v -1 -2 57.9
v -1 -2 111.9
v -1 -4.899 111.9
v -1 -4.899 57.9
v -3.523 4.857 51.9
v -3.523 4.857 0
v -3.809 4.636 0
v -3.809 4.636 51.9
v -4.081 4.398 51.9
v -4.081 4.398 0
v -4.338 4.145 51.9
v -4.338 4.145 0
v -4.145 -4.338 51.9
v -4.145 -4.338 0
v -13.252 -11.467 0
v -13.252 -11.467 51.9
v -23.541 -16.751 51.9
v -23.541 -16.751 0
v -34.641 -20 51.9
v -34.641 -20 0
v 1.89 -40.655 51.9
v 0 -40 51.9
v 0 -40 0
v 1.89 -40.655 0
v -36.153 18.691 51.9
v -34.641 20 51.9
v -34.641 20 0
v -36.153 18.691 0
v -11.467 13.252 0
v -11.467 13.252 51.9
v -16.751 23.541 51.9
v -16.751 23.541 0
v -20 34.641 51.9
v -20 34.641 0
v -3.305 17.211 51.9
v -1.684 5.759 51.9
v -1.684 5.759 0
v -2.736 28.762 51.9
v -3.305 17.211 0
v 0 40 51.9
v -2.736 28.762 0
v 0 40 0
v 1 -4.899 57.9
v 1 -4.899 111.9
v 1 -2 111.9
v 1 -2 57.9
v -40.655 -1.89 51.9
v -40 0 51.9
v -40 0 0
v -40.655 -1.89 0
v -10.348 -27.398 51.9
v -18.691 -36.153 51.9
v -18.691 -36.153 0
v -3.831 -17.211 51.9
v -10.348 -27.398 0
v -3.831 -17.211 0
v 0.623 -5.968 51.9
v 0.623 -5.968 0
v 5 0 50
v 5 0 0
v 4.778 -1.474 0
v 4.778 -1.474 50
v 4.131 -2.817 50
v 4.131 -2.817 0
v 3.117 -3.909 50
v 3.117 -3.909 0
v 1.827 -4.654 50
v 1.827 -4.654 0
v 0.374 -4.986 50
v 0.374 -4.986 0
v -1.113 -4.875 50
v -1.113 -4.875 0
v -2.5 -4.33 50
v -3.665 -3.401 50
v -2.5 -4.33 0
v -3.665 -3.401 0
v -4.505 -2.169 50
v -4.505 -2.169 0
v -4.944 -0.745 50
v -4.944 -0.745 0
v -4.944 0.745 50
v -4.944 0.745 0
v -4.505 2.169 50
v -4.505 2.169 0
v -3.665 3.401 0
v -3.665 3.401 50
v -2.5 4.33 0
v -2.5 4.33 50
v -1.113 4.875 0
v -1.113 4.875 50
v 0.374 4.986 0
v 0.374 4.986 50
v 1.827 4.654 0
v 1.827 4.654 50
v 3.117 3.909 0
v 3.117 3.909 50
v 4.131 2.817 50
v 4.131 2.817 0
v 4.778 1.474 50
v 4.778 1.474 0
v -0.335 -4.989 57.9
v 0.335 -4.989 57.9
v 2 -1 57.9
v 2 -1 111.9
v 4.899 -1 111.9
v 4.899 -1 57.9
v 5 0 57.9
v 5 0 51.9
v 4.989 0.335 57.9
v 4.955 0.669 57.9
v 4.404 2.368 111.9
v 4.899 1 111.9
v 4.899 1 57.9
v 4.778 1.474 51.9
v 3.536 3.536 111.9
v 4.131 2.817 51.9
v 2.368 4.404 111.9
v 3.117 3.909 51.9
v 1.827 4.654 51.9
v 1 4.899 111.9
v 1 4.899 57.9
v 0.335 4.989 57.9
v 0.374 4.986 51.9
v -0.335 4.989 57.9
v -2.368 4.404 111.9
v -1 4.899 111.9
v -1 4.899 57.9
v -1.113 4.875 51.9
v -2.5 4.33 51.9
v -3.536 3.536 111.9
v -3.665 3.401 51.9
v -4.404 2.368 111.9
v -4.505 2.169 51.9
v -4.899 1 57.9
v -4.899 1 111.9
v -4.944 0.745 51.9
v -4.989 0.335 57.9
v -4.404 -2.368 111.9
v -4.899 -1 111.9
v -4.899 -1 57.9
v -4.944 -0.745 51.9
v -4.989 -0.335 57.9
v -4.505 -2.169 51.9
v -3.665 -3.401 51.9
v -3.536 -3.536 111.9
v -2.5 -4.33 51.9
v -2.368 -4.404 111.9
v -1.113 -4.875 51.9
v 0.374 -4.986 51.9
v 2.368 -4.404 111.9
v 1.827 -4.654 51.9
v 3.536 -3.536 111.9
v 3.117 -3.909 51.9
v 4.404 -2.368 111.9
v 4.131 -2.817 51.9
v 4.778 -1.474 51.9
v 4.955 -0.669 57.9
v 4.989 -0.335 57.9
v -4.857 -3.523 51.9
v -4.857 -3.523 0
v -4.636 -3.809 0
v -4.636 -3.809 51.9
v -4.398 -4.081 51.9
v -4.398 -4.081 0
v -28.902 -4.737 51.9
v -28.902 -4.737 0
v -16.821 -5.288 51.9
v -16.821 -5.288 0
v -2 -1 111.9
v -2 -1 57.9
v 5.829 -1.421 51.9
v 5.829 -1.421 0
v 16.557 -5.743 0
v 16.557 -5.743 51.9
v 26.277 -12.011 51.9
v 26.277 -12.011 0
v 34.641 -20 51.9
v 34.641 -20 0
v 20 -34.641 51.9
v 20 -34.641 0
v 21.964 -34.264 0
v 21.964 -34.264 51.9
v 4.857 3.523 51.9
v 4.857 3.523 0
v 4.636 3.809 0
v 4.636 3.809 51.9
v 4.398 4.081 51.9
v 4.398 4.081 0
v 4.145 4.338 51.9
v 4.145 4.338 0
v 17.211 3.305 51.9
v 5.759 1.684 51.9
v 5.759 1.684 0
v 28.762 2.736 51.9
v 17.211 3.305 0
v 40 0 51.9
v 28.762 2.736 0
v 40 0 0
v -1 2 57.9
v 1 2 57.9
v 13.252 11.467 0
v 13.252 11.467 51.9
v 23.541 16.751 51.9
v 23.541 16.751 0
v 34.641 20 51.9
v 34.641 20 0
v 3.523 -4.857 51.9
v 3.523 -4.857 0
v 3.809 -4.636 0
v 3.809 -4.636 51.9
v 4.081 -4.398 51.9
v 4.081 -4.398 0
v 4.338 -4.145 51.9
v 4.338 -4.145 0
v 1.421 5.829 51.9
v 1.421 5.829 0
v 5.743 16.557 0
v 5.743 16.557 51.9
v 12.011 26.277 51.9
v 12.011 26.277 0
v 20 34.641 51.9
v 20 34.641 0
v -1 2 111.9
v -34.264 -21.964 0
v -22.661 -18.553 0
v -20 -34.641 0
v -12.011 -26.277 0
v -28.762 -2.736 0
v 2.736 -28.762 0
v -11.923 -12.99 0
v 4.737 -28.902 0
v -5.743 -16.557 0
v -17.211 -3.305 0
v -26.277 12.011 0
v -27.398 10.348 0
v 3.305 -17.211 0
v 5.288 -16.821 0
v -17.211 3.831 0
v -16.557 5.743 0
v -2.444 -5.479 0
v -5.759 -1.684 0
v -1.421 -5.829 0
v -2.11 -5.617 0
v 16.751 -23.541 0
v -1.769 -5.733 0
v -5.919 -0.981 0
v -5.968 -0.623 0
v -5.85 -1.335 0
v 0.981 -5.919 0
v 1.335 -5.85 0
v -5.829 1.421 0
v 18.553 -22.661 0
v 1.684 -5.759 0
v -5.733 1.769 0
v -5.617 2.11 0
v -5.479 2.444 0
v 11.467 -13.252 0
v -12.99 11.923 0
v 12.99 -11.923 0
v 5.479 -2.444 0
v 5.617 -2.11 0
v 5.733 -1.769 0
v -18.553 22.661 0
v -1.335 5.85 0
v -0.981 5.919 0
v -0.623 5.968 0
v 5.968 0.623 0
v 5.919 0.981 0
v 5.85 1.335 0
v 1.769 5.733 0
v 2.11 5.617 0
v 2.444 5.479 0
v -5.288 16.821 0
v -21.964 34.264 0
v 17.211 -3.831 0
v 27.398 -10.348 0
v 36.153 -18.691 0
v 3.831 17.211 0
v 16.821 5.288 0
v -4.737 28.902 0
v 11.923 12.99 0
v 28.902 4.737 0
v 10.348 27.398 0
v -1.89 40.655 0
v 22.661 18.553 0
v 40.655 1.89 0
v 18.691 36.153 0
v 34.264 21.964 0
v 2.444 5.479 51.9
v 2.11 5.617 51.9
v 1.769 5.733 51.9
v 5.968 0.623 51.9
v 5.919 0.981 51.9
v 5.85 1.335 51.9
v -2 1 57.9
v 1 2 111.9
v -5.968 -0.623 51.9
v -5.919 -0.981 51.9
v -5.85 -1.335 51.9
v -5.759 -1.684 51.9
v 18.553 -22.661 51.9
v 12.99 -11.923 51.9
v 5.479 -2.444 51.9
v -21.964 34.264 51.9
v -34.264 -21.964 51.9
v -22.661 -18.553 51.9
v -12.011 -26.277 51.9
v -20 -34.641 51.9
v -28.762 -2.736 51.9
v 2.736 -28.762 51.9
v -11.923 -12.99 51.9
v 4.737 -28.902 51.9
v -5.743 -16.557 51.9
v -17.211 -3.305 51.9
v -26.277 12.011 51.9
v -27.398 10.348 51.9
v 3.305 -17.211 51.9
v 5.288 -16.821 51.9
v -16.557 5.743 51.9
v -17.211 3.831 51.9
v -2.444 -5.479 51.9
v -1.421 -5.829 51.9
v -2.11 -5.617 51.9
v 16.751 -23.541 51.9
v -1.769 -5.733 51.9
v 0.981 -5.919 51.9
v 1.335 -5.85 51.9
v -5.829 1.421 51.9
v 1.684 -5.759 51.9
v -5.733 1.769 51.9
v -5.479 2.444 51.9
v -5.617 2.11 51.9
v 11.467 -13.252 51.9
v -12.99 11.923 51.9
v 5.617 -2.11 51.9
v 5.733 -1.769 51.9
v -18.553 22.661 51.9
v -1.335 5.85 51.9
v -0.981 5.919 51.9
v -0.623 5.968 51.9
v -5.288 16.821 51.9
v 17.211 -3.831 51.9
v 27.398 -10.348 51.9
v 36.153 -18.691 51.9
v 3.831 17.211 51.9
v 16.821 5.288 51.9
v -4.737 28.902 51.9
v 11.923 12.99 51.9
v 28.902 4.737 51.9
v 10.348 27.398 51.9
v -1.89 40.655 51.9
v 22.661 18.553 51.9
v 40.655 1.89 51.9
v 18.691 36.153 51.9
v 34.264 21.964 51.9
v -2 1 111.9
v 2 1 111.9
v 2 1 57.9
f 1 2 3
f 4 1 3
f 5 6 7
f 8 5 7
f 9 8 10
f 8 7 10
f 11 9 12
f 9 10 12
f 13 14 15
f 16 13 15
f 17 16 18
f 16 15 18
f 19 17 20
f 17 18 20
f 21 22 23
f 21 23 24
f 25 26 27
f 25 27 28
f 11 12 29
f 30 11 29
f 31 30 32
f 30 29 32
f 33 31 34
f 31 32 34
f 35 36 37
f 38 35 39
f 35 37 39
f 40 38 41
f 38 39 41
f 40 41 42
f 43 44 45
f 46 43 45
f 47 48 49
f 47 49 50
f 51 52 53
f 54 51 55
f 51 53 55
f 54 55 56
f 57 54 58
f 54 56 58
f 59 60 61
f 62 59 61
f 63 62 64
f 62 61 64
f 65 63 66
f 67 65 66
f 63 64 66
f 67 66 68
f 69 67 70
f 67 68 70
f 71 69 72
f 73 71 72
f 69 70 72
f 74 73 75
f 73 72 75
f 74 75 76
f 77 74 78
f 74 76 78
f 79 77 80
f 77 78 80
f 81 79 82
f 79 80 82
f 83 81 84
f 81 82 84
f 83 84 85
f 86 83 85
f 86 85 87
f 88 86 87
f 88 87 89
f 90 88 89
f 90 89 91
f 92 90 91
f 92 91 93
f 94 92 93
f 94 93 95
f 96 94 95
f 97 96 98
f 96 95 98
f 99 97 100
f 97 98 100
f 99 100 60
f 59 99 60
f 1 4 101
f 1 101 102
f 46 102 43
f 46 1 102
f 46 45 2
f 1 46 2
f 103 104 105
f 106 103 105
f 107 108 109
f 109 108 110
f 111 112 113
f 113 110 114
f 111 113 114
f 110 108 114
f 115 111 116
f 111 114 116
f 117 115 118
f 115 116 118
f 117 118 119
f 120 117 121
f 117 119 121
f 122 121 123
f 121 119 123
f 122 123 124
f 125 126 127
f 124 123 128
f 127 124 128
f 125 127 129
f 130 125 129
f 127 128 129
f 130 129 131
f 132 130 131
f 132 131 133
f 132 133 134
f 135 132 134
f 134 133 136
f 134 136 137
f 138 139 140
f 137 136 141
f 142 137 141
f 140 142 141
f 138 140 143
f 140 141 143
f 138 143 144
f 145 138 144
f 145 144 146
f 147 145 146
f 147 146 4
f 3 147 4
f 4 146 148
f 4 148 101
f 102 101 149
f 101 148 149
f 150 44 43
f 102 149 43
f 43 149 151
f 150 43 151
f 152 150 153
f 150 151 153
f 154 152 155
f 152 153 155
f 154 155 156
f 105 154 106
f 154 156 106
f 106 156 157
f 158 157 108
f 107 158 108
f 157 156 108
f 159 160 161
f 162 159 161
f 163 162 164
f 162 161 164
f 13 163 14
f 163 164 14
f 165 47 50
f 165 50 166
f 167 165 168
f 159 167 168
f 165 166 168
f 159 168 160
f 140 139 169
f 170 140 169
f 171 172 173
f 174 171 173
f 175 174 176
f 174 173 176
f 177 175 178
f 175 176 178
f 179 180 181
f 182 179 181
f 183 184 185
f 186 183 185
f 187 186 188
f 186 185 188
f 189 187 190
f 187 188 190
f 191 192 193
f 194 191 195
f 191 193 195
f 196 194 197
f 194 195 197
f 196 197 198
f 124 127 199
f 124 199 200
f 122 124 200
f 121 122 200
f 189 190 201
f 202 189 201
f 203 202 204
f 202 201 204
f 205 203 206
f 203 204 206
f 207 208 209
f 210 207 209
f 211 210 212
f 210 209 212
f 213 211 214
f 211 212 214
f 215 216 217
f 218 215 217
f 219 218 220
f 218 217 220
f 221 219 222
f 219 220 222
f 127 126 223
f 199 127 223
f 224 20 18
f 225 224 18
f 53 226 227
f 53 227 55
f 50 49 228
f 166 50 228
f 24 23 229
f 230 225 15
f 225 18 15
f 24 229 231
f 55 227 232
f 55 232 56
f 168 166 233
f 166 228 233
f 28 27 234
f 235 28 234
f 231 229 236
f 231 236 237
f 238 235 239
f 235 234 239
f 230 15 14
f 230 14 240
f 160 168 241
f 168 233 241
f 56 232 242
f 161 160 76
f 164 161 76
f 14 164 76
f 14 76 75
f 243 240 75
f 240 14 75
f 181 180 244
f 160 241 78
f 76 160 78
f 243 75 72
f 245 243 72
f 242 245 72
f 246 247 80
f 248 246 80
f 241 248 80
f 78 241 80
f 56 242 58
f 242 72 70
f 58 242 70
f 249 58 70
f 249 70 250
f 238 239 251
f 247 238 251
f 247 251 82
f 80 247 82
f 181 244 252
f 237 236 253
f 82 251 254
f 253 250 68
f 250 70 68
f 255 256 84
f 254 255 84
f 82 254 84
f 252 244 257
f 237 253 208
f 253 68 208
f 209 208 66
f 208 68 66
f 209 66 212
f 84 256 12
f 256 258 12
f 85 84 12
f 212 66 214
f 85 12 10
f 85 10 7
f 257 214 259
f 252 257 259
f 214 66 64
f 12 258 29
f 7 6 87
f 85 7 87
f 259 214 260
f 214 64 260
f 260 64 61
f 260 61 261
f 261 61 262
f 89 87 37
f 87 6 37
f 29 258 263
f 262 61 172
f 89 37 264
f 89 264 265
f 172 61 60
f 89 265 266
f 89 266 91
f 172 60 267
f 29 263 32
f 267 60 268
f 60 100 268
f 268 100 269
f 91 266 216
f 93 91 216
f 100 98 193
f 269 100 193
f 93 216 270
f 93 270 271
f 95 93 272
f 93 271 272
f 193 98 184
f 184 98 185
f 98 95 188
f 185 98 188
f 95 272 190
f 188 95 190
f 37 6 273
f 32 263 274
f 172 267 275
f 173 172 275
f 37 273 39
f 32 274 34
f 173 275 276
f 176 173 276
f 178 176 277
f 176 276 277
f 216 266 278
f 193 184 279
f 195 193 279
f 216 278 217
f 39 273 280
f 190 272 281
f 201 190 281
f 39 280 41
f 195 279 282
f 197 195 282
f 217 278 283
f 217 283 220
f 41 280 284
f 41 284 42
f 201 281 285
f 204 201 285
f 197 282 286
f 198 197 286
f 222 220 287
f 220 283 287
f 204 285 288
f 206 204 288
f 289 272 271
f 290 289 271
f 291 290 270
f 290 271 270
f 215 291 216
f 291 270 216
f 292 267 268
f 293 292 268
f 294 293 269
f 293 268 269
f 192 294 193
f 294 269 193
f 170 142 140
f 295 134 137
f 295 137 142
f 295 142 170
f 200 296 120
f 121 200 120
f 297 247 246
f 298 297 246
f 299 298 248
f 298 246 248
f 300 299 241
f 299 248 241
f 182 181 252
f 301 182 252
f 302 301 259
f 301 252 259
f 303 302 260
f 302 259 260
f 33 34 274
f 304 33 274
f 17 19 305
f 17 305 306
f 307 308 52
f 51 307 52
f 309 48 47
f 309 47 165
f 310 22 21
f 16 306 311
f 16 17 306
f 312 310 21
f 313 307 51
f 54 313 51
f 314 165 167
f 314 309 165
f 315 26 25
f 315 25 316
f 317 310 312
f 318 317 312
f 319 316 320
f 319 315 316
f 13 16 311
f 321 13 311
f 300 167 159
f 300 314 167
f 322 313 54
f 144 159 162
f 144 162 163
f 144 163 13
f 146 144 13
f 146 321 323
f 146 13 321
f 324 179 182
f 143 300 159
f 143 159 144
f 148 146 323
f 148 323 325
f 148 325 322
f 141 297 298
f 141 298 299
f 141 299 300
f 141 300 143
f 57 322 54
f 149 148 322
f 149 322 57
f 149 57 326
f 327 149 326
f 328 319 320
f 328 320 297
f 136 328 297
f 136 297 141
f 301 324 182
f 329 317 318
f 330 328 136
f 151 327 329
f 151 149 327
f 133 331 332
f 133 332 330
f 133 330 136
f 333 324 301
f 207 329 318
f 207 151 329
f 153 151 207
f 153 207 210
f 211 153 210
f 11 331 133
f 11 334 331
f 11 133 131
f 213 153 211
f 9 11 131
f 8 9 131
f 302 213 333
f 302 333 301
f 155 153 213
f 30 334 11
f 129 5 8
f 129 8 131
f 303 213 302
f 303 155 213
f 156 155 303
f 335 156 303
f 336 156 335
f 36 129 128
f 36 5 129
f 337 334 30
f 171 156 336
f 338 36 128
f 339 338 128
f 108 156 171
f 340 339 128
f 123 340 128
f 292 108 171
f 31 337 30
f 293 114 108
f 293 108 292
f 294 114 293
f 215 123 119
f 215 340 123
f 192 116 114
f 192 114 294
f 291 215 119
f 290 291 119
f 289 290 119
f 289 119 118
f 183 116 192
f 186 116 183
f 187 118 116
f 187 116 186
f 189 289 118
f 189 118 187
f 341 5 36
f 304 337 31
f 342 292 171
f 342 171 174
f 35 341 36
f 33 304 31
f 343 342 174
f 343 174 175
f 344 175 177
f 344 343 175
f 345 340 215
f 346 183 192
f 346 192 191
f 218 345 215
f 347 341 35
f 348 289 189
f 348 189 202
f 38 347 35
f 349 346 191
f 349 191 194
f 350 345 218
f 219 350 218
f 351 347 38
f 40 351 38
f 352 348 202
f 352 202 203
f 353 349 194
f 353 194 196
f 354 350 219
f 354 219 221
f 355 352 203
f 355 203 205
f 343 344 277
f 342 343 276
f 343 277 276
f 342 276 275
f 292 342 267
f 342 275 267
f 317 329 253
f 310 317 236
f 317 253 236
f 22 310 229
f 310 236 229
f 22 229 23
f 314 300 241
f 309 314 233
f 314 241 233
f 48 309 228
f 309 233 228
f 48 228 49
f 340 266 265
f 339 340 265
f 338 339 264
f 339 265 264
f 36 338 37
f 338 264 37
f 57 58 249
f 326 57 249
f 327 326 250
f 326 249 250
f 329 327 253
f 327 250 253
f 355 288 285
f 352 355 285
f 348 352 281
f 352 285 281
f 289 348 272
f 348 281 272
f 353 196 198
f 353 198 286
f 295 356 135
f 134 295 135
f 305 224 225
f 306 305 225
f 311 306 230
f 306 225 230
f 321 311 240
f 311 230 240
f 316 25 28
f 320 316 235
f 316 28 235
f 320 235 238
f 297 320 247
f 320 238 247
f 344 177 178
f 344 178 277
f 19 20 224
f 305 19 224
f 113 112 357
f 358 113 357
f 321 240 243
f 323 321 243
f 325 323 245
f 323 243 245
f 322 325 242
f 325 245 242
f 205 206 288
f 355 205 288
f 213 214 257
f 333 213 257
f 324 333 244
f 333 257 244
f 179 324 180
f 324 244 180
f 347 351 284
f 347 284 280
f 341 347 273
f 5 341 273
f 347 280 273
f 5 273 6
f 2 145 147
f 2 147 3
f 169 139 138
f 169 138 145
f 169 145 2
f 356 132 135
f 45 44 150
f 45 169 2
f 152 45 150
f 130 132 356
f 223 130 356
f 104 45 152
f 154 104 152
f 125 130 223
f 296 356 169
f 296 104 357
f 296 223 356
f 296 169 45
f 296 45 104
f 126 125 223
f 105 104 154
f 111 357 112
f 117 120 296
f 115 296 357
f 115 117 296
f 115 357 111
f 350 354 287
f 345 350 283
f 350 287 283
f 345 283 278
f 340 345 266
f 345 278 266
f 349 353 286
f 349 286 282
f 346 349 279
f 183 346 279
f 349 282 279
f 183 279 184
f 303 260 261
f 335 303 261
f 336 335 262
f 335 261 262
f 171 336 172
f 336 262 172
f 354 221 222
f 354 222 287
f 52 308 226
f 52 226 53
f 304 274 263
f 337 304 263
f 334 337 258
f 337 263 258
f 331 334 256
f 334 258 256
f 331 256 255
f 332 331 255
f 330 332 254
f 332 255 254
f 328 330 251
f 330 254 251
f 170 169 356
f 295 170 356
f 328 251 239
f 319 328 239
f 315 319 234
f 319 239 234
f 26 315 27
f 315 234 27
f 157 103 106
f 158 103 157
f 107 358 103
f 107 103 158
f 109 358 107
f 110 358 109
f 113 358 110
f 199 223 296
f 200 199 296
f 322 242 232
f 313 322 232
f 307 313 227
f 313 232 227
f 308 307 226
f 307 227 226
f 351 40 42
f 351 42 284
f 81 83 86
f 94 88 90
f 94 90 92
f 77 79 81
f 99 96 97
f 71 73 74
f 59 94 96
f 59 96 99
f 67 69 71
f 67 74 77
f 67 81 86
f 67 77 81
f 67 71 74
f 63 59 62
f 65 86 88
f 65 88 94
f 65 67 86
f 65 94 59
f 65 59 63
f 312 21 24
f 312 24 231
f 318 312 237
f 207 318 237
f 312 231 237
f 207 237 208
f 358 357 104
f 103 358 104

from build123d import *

# Parameters (mm, degrees)
F1_DEPTH = 51.9
F2_R     = 5
F3_DEPTH = 50
F4_R     = 5
F5_DEPTH = 60
F7_DEPTH = 54


with BuildPart() as f1:
    # F0 (on Top) → F1 (new body)
    with BuildSketch(Plane.XY):
        with BuildLine():
            ThreePointArc((1.3337239415, 1.4907111791), (1.4431608729, 1.6087570846), (1.5529086216, 1.7265140778))
            ThreePointArc((1.5529086216, 1.7265140778), (0.9818308126, 1.8448281713), (0.4096832255, 1.9578557215))
            ThreePointArc((0.4096832255, 1.9578557215), (0.1968239575, 0.980605563), (0, 0))
            ThreePointArc((0, 0), (0.6607573288, 0.7508173499), (1.3337239415, 1.4907111791))
        make_face()
        with BuildLine():
            ThreePointArc((1.9003944045, 0.62413178), (2.05419252, 0.6716440673), (2.2081153549, 0.7187507406))
            ThreePointArc((2.2081153549, 0.7187507406), (1.7727045116, 1.1067526557), (1.3337239415, 1.4907111791))
            ThreePointArc((1.3337239415, 1.4907111791), (0.6607573288, 0.7508173499), (0, 0))
            ThreePointArc((0, 0), (0.9476413074, 0.3198482342), (1.9003944045, 0.62413178))
        make_face()
        with BuildLine():
            ThreePointArc((1.9578557215, -0.4096832255), (2.1148049403, -0.4454354354), (2.2716593622, -0.4816012771))
            ThreePointArc((2.2716593622, -0.4816012771), (2.0885834683, 0.0721236597), (1.9003944045, 0.62413178))
            ThreePointArc((1.9003944045, 0.62413178), (0.9476413074, 0.3198482342), (0, 0))
            ThreePointArc((0, 0), (0.980605563, -0.1968239575), (1.9578557215, -0.4096832255))
        make_face()
        with BuildLine():
            ThreePointArc((1.7265140778, -1.5529086216), (1.8448281713, -0.9818308126), (1.9578557215, -0.4096832255))
            ThreePointArc((1.9578557215, -0.4096832255), (0.980605563, -0.1968239575), (0, 0))
            ThreePointArc((0, 0), (0.7508173499, -0.6607573288), (1.4907111791, -1.3337239415))
            ThreePointArc((1.4907111791, -1.3337239415), (1.6087570846, -1.4431608729), (1.7265140778, -1.5529086216))
        make_face()
        with BuildLine():
            ThreePointArc((1.4907111791, -1.3337239415), (0.7508173499, -0.6607573288), (0, 0))
            ThreePointArc((0, 0), (0.3198482342, -0.9476413074), (0.62413178, -1.9003944045))
            ThreePointArc((0.62413178, -1.9003944045), (0.6716440673, -2.05419252), (0.7187507406, -2.2081153549))
            ThreePointArc((0.7187507406, -2.2081153549), (1.1067526557, -1.7727045116), (1.4907111791, -1.3337239415))
        make_face()
        with BuildLine():
            ThreePointArc((0.62413178, -1.9003944045), (0.3198482342, -0.9476413074), (0, 0))
            ThreePointArc((0, 0), (-0.1968239575, -0.980605563), (-0.4096832255, -1.9578557215))
            ThreePointArc((-0.4096832255, -1.9578557215), (-0.4454354354, -2.1148049403), (-0.4816012771, -2.2716593622))
            ThreePointArc((-0.4816012771, -2.2716593622), (0.0721236597, -2.0885834683), (0.62413178, -1.9003944045))
        make_face()
        with BuildLine():
            ThreePointArc((-0.4096832255, -1.9578557215), (-0.1968239575, -0.980605563), (0, 0))
            ThreePointArc((0, 0), (-0.6607573288, -0.7508173499), (-1.3337239415, -1.4907111791))
            ThreePointArc((-1.3337239415, -1.4907111791), (-1.4431608729, -1.6087570846), (-1.5529086216, -1.7265140778))
            ThreePointArc((-1.5529086216, -1.7265140778), (-0.9818308126, -1.8448281713), (-0.4096832255, -1.9578557215))
        make_face()
        with BuildLine():
            ThreePointArc((-1.3337239415, -1.4907111791), (-0.6607573288, -0.7508173499), (0, 0))
            ThreePointArc((0, 0), (-0.9476413074, -0.3198482342), (-1.9003944045, -0.62413178))
            ThreePointArc((-1.9003944045, -0.62413178), (-2.05419252, -0.6716440673), (-2.2081153549, -0.7187507406))
            ThreePointArc((-2.2081153549, -0.7187507406), (-1.7727045116, -1.1067526557), (-1.3337239415, -1.4907111791))
        make_face()
        with BuildLine():
            ThreePointArc((-1.9003944045, -0.62413178), (-0.9476413074, -0.3198482342), (0, 0))
            ThreePointArc((0, 0), (-0.980605563, 0.1968239575), (-1.9578557215, 0.4096832255))
            ThreePointArc((-1.9578557215, 0.4096832255), (-2.1148049403, 0.4454354354), (-2.2716593622, 0.4816012771))
            ThreePointArc((-2.2716593622, 0.4816012771), (-2.0885834683, -0.0721236597), (-1.9003944045, -0.62413178))
        make_face()
        with BuildLine():
            ThreePointArc((-1.9578557215, 0.4096832255), (-0.980605563, 0.1968239575), (0, 0))
            ThreePointArc((0, 0), (-0.7508173499, 0.6607573288), (-1.4907111791, 1.3337239415))
            ThreePointArc((-1.4907111791, 1.3337239415), (-1.6087570846, 1.4431608729), (-1.7265140778, 1.5529086216))
            ThreePointArc((-1.7265140778, 1.5529086216), (-1.8448281713, 0.9818308126), (-1.9578557215, 0.4096832255))
        make_face()
        with BuildLine():
            ThreePointArc((-1.4907111791, 1.3337239415), (-0.7508173499, 0.6607573288), (0, 0))
            ThreePointArc((0, 0), (-0.3198482342, 0.9476413074), (-0.62413178, 1.9003944045))
            ThreePointArc((-0.62413178, 1.9003944045), (-0.6716440673, 2.05419252), (-0.7187507406, 2.2081153549))
            ThreePointArc((-0.7187507406, 2.2081153549), (-1.1067526557, 1.7727045116), (-1.4907111791, 1.3337239415))
        make_face()
        with BuildLine():
            ThreePointArc((0, 0), (0.1968239575, 0.980605563), (0.4096832255, 1.9578557215))
            ThreePointArc((0.4096832255, 1.9578557215), (0.4454354354, 2.1148049403), (0.4816012771, 2.2716593622))
            ThreePointArc((0.4816012771, 2.2716593622), (-0.0721236597, 2.0885834683), (-0.62413178, 1.9003944045))
            ThreePointArc((-0.62413178, 1.9003944045), (-0.3198482342, 0.9476413074), (0, 0))
        make_face()
        with BuildLine():
            ThreePointArc((-0.62413178, 1.9003944045), (-0.0721236597, 2.0885834683), (0.4816012771, 2.2716593622))
            ThreePointArc((0.4816012771, 2.2716593622), (0.6806785767, 3.1033997904), (0.8913857306, 3.9322703511))
            ThreePointArc((0.8913857306, 3.9322703511), (0.0782542347, 3.0777228892), (-0.7187507406, 2.2081153549))
            ThreePointArc((-0.7187507406, 2.2081153549), (-0.6716440673, 2.05419252), (-0.62413178, 1.9003944045))
        make_face()
        with BuildLine():
            ThreePointArc((0.4096832255, 1.9578557215), (0.9818308126, 1.8448281713), (1.5529086216, 1.7265140778))
            ThreePointArc((1.5529086216, 1.7265140778), (2.1411848344, 2.3472837682), (2.7380978628, 2.9597531533))
            ThreePointArc((2.7380978628, 2.9597531533), (1.6066315998, 2.6262590905), (0.4816012771, 2.2716593622))
            ThreePointArc((0.4816012771, 2.2716593622), (0.4454354354, 2.1148049403), (0.4096832255, 1.9578557215))
        make_face()
        with BuildLine():
            ThreePointArc((2.2081153549, 0.7187507406), (3.0279623449, 0.9622149559), (3.8511388839, 1.1941724883))
            ThreePointArc((3.8511388839, 1.1941724883), (2.7045133252, 1.4710912894), (1.5529086216, 1.7265140778))
            ThreePointArc((1.5529086216, 1.7265140778), (1.4431608729, 1.6087570846), (1.3337239415, 1.4907111791))
            ThreePointArc((1.3337239415, 1.4907111791), (1.7727045116, 1.1067526557), (2.2081153549, 0.7187507406))
        make_face()
        with BuildLine():
            ThreePointArc((5.8293856058, -1.4206559961), (5.9571937032, -0.715432165), (6, 0))
            ThreePointArc((6, 0), (5.991893307, 0.311792555), (5.9675951342, 0.6227425745))
            ThreePointArc((5.9675951342, 0.6227425745), (4.9118503598, 0.9176553403), (3.8511388839, 1.1941724883))
            ThreePointArc((3.8511388839, 1.1941724883), (3.0279623449, 0.9622149559), (2.2081153549, 0.7187507406))
            ThreePointArc((2.2081153549, 0.7187507406), (3.0777228892, -0.0782542347), (3.9322703511, -0.8913857306))
            ThreePointArc((3.9322703511, -0.8913857306), (4.882962136, -1.1483711934), (5.8293856058, -1.4206559961))
        make_face()
        with BuildLine():
            ThreePointArc((2.2716593622, -0.4816012771), (3.1033997904, -0.6806785767), (3.9322703511, -0.8913857306))
            ThreePointArc((3.9322703511, -0.8913857306), (3.0777228892, -0.0782542347), (2.2081153549, 0.7187507406))
            ThreePointArc((2.2081153549, 0.7187507406), (2.05419252, 0.6716440673), (1.9003944045, 0.62413178))
            ThreePointArc((1.9003944045, 0.62413178), (2.0885834683, 0.0721236597), (2.2716593622, -0.4816012771))
        make_face()
        with BuildLine():
            ThreePointArc((3.8511388839, 1.1941724883), (4.8029548522, 1.4469624415), (5.7587240211, 1.6843686202))
            ThreePointArc((5.7587240211, 1.6843686202), (5.3867561456, 2.642509835), (4.8567176985, 3.5231084567))
            ThreePointArc((4.8567176985, 3.5231084567), (3.794959521, 3.2506380165), (2.7380978628, 2.9597531533))
            ThreePointArc((2.7380978628, 2.9597531533), (2.1411848344, 2.3472837682), (1.5529086216, 1.7265140778))
            ThreePointArc((1.5529086216, 1.7265140778), (2.7045133252, 1.4710912894), (3.8511388839, 1.1941724883))
        make_face()
        with BuildLine():
            ThreePointArc((2.7380978628, 2.9597531533), (3.4359996944, 3.6545836588), (4.1450169856, 4.338068025))
            ThreePointArc((4.1450169856, 4.338068025), (3.3438127486, 4.9818587196), (2.4444866775, 5.479460273))
            ThreePointArc((2.4444866775, 5.479460273), (1.6612123432, 4.7126148613), (0.8913857306, 3.9322703511))
            ThreePointArc((0.8913857306, 3.9322703511), (0.6806785767, 3.1033997904), (0.4816012771, 2.2716593622))
            ThreePointArc((0.4816012771, 2.2716593622), (1.6066315998, 2.6262590905), (2.7380978628, 2.9597531533))
        make_face()
        with BuildLine():
            ThreePointArc((4.338068025, -4.1450169856), (4.9818587196, -3.3438127486), (5.479460273, -2.4444866775))
            ThreePointArc((5.479460273, -2.4444866775), (4.7126148613, -1.6612123432), (3.9322703511, -0.8913857306))
            ThreePointArc((3.9322703511, -0.8913857306), (3.1033997904, -0.6806785767), (2.2716593622, -0.4816012771))
            ThreePointArc((2.2716593622, -0.4816012771), (2.6262590905, -1.6066315998), (2.9597531533, -2.7380978628))
            ThreePointArc((2.9597531533, -2.7380978628), (3.6545836588, -3.4359996944), (4.338068025, -4.1450169856))
        make_face()
        with BuildLine():
            ThreePointArc((2.9597531533, -2.7380978628), (2.6262590905, -1.6066315998), (2.2716593622, -0.4816012771))
            ThreePointArc((2.2716593622, -0.4816012771), (2.1148049403, -0.4454354354), (1.9578557215, -0.4096832255))
            ThreePointArc((1.9578557215, -0.4096832255), (1.8448281713, -0.9818308126), (1.7265140778, -1.5529086216))
            ThreePointArc((1.7265140778, -1.5529086216), (2.3472837682, -2.1411848344), (2.9597531533, -2.7380978628))
        make_face()
        with BuildLine():
            ThreePointArc((1.6843686202, -5.7587240211), (2.642509835, -5.3867561456), (3.5231084567, -4.8567176985))
            ThreePointArc((3.5231084567, -4.8567176985), (3.2506380165, -3.794959521), (2.9597531533, -2.7380978628))
            ThreePointArc((2.9597531533, -2.7380978628), (2.3472837682, -2.1411848344), (1.7265140778, -1.5529086216))
            ThreePointArc((1.7265140778, -1.5529086216), (1.4710912894, -2.7045133252), (1.1941724883, -3.8511388839))
            ThreePointArc((1.1941724883, -3.8511388839), (1.4469624415, -4.8029548522), (1.6843686202, -5.7587240211))
        make_face()
        with BuildLine():
            ThreePointArc((1.1941724883, -3.8511388839), (1.4710912894, -2.7045133252), (1.7265140778, -1.5529086216))
            ThreePointArc((1.7265140778, -1.5529086216), (1.6087570846, -1.4431608729), (1.4907111791, -1.3337239415))
            ThreePointArc((1.4907111791, -1.3337239415), (1.1067526557, -1.7727045116), (0.7187507406, -2.2081153549))
            ThreePointArc((0.7187507406, -2.2081153549), (0.9622149559, -3.0279623449), (1.1941724883, -3.8511388839))
        make_face()
        with BuildLine():
            ThreePointArc((-1.4206559961, -5.8293856058), (-0.4048974259, -5.9863225836), (0.6227425745, -5.9675951342))
            ThreePointArc((0.6227425745, -5.9675951342), (0.9176553403, -4.9118503598), (1.1941724883, -3.8511388839))
            ThreePointArc((1.1941724883, -3.8511388839), (0.9622149559, -3.0279623449), (0.7187507406, -2.2081153549))
            ThreePointArc((0.7187507406, -2.2081153549), (-0.0782542347, -3.0777228892), (-0.8913857306, -3.9322703511))
            ThreePointArc((-0.8913857306, -3.9322703511), (-1.1483711934, -4.882962136), (-1.4206559961, -5.8293856058))
        make_face()
        with BuildLine():
            ThreePointArc((0.7187507406, -2.2081153549), (0.6716440673, -2.05419252), (0.62413178, -1.9003944045))
            ThreePointArc((0.62413178, -1.9003944045), (0.0721236597, -2.0885834683), (-0.4816012771, -2.2716593622))
            ThreePointArc((-0.4816012771, -2.2716593622), (-0.6806785767, -3.1033997904), (-0.8913857306, -3.9322703511))
            ThreePointArc((-0.8913857306, -3.9322703511), (-0.0782542347, -3.0777228892), (0.7187507406, -2.2081153549))
        make_face()
        with BuildLine():
            ThreePointArc((-0.8913857306, -3.9322703511), (-0.6806785767, -3.1033997904), (-0.4816012771, -2.2716593622))
            ThreePointArc((-0.4816012771, -2.2716593622), (-1.6066315998, -2.6262590905), (-2.7380978628, -2.9597531533))
            ThreePointArc((-2.7380978628, -2.9597531533), (-3.4359996944, -3.6545836588), (-4.1450169856, -4.338068025))
            ThreePointArc((-4.1450169856, -4.338068025), (-3.3438127486, -4.9818587196), (-2.4444866775, -5.479460273))
            ThreePointArc((-2.4444866775, -5.479460273), (-1.6612123432, -4.7126148613), (-0.8913857306, -3.9322703511))
        make_face()
        with BuildLine():
            ThreePointArc((-0.4816012771, -2.2716593622), (-0.4454354354, -2.1148049403), (-0.4096832255, -1.9578557215))
            ThreePointArc((-0.4096832255, -1.9578557215), (-0.9818308126, -1.8448281713), (-1.5529086216, -1.7265140778))
            ThreePointArc((-1.5529086216, -1.7265140778), (-2.1411848344, -2.3472837682), (-2.7380978628, -2.9597531533))
            ThreePointArc((-2.7380978628, -2.9597531533), (-1.6066315998, -2.6262590905), (-0.4816012771, -2.2716593622))
        make_face()
        with BuildLine():
            ThreePointArc((-2.7380978628, -2.9597531533), (-2.1411848344, -2.3472837682), (-1.5529086216, -1.7265140778))
            ThreePointArc((-1.5529086216, -1.7265140778), (-2.7045133252, -1.4710912894), (-3.8511388839, -1.1941724883))
            ThreePointArc((-3.8511388839, -1.1941724883), (-4.8029548522, -1.4469624415), (-5.7587240211, -1.6843686202))
            ThreePointArc((-5.7587240211, -1.6843686202), (-5.3867561456, -2.642509835), (-4.8567176985, -3.5231084567))
            ThreePointArc((-4.8567176985, -3.5231084567), (-3.794959521, -3.2506380165), (-2.7380978628, -2.9597531533))
        make_face()
        with BuildLine():
            ThreePointArc((-1.5529086216, -1.7265140778), (-1.4431608729, -1.6087570846), (-1.3337239415, -1.4907111791))
            ThreePointArc((-1.3337239415, -1.4907111791), (-1.7727045116, -1.1067526557), (-2.2081153549, -0.7187507406))
            ThreePointArc((-2.2081153549, -0.7187507406), (-3.0279623449, -0.9622149559), (-3.8511388839, -1.1941724883))
            ThreePointArc((-3.8511388839, -1.1941724883), (-2.7045133252, -1.4710912894), (-1.5529086216, -1.7265140778))
        make_face()
        with BuildLine():
            ThreePointArc((-3.8511388839, -1.1941724883), (-3.0279623449, -0.9622149559), (-2.2081153549, -0.7187507406))
            ThreePointArc((-2.2081153549, -0.7187507406), (-3.0777228892, 0.0782542347), (-3.9322703511, 0.8913857306))
            ThreePointArc((-3.9322703511, 0.8913857306), (-4.882962136, 1.1483711934), (-5.8293856058, 1.4206559961))
            ThreePointArc((-5.8293856058, 1.4206559961), (-5.9863225836, 0.4048974259), (-5.9675951342, -0.6227425745))
            ThreePointArc((-5.9675951342, -0.6227425745), (-4.9118503598, -0.9176553403), (-3.8511388839, -1.1941724883))
        make_face()
        with BuildLine():
            ThreePointArc((-2.2081153549, -0.7187507406), (-2.05419252, -0.6716440673), (-1.9003944045, -0.62413178))
            ThreePointArc((-1.9003944045, -0.62413178), (-2.0885834683, -0.0721236597), (-2.2716593622, 0.4816012771))
            ThreePointArc((-2.2716593622, 0.4816012771), (-3.1033997904, 0.6806785767), (-3.9322703511, 0.8913857306))
            ThreePointArc((-3.9322703511, 0.8913857306), (-3.0777228892, 0.0782542347), (-2.2081153549, -0.7187507406))
        make_face()
        with BuildLine():
            ThreePointArc((-3.9322703511, 0.8913857306), (-3.1033997904, 0.6806785767), (-2.2716593622, 0.4816012771))
            ThreePointArc((-2.2716593622, 0.4816012771), (-2.6262590905, 1.6066315998), (-2.9597531533, 2.7380978628))
            ThreePointArc((-2.9597531533, 2.7380978628), (-3.6545836588, 3.4359996944), (-4.338068025, 4.1450169856))
            ThreePointArc((-4.338068025, 4.1450169856), (-4.9818587196, 3.3438127486), (-5.479460273, 2.4444866775))
            ThreePointArc((-5.479460273, 2.4444866775), (-4.7126148613, 1.6612123432), (-3.9322703511, 0.8913857306))
        make_face()
        with BuildLine():
            ThreePointArc((-2.2716593622, 0.4816012771), (-2.1148049403, 0.4454354354), (-1.9578557215, 0.4096832255))
            ThreePointArc((-1.9578557215, 0.4096832255), (-1.8448281713, 0.9818308126), (-1.7265140778, 1.5529086216))
            ThreePointArc((-1.7265140778, 1.5529086216), (-2.3472837682, 2.1411848344), (-2.9597531533, 2.7380978628))
            ThreePointArc((-2.9597531533, 2.7380978628), (-2.6262590905, 1.6066315998), (-2.2716593622, 0.4816012771))
        make_face()
        with BuildLine():
            ThreePointArc((-2.9597531533, 2.7380978628), (-2.3472837682, 2.1411848344), (-1.7265140778, 1.5529086216))
            ThreePointArc((-1.7265140778, 1.5529086216), (-1.4710912894, 2.7045133252), (-1.1941724883, 3.8511388839))
            ThreePointArc((-1.1941724883, 3.8511388839), (-1.4469624415, 4.8029548522), (-1.6843686202, 5.7587240211))
            ThreePointArc((-1.6843686202, 5.7587240211), (-2.642509835, 5.3867561456), (-3.5231084567, 4.8567176985))
            ThreePointArc((-3.5231084567, 4.8567176985), (-3.2506380165, 3.794959521), (-2.9597531533, 2.7380978628))
        make_face()
        with BuildLine():
            ThreePointArc((-1.7265140778, 1.5529086216), (-1.6087570846, 1.4431608729), (-1.4907111791, 1.3337239415))
            ThreePointArc((-1.4907111791, 1.3337239415), (-1.1067526557, 1.7727045116), (-0.7187507406, 2.2081153549))
            ThreePointArc((-0.7187507406, 2.2081153549), (-0.9622149559, 3.0279623449), (-1.1941724883, 3.8511388839))
            ThreePointArc((-1.1941724883, 3.8511388839), (-1.4710912894, 2.7045133252), (-1.7265140778, 1.5529086216))
        make_face()
        with BuildLine():
            ThreePointArc((0.8913857306, 3.9322703511), (1.1483711934, 4.882962136), (1.4206559961, 5.8293856058))
            ThreePointArc((1.4206559961, 5.8293856058), (0.4048974259, 5.9863225836), (-0.6227425745, 5.9675951342))
            ThreePointArc((-0.6227425745, 5.9675951342), (-0.9176553403, 4.9118503598), (-1.1941724883, 3.8511388839))
            ThreePointArc((-1.1941724883, 3.8511388839), (-0.9622149559, 3.0279623449), (-0.7187507406, 2.2081153549))
            ThreePointArc((-0.7187507406, 2.2081153549), (0.0782542347, 3.0777228892), (0.8913857306, 3.9322703511))
        make_face()
        with BuildLine():
            ThreePointArc((0.8913857306, 3.9322703511), (1.6612123432, 4.7126148613), (2.4444866775, 5.479460273))
            ThreePointArc((2.4444866775, 5.479460273), (1.9404751755, 5.6775484228), (1.4206559961, 5.8293856058))
            ThreePointArc((1.4206559961, 5.8293856058), (1.1483711934, 4.882962136), (0.8913857306, 3.9322703511))
        make_face()
        with BuildLine():
            ThreePointArc((2.7380978628, 2.9597531533), (3.794959521, 3.2506380165), (4.8567176985, 3.5231084567))
            ThreePointArc((4.8567176985, 3.5231084567), (4.5192750088, 3.9466635776), (4.1450169856, 4.338068025))
            ThreePointArc((4.1450169856, 4.338068025), (3.4359996944, 3.6545836588), (2.7380978628, 2.9597531533))
        make_face()
        with BuildLine():
            ThreePointArc((3.8511388839, 1.1941724883), (4.9118503598, 0.9176553403), (5.9675951342, 0.6227425745))
            ThreePointArc((5.9675951342, 0.6227425745), (5.8871387531, 1.158273414), (5.7587240211, 1.6843686202))
            ThreePointArc((5.7587240211, 1.6843686202), (4.8029548522, 1.4469624415), (3.8511388839, 1.1941724883))
        make_face()
        with BuildLine():
            ThreePointArc((5.479460273, -2.4444866775), (5.6775484228, -1.9404751755), (5.8293856058, -1.4206559961))
            ThreePointArc((5.8293856058, -1.4206559961), (4.882962136, -1.1483711934), (3.9322703511, -0.8913857306))
            ThreePointArc((3.9322703511, -0.8913857306), (4.7126148613, -1.6612123432), (5.479460273, -2.4444866775))
        make_face()
        with BuildLine():
            ThreePointArc((3.5231084567, -4.8567176985), (3.9466635776, -4.5192750088), (4.338068025, -4.1450169856))
            ThreePointArc((4.338068025, -4.1450169856), (3.6545836588, -3.4359996944), (2.9597531533, -2.7380978628))
            ThreePointArc((2.9597531533, -2.7380978628), (3.2506380165, -3.794959521), (3.5231084567, -4.8567176985))
        make_face()
        with BuildLine():
            ThreePointArc((0.6227425745, -5.9675951342), (1.158273414, -5.8871387531), (1.6843686202, -5.7587240211))
            ThreePointArc((1.6843686202, -5.7587240211), (1.4469624415, -4.8029548522), (1.1941724883, -3.8511388839))
            ThreePointArc((1.1941724883, -3.8511388839), (0.9176553403, -4.9118503598), (0.6227425745, -5.9675951342))
        make_face()
        with BuildLine():
            ThreePointArc((-2.4444866775, -5.479460273), (-1.9404751755, -5.6775484228), (-1.4206559961, -5.8293856058))
            ThreePointArc((-1.4206559961, -5.8293856058), (-1.1483711934, -4.882962136), (-0.8913857306, -3.9322703511))
            ThreePointArc((-0.8913857306, -3.9322703511), (-1.6612123432, -4.7126148613), (-2.4444866775, -5.479460273))
        make_face()
        with BuildLine():
            ThreePointArc((-4.1450169856, -4.338068025), (-3.4359996944, -3.6545836588), (-2.7380978628, -2.9597531533))
            ThreePointArc((-2.7380978628, -2.9597531533), (-3.794959521, -3.2506380165), (-4.8567176985, -3.5231084567))
            ThreePointArc((-4.8567176985, -3.5231084567), (-4.5192750088, -3.9466635776), (-4.1450169856, -4.338068025))
        make_face()
        with BuildLine():
            ThreePointArc((-5.7587240211, -1.6843686202), (-4.8029548522, -1.4469624415), (-3.8511388839, -1.1941724883))
            ThreePointArc((-3.8511388839, -1.1941724883), (-4.9118503598, -0.9176553403), (-5.9675951342, -0.6227425745))
            ThreePointArc((-5.9675951342, -0.6227425745), (-5.8871387531, -1.158273414), (-5.7587240211, -1.6843686202))
        make_face()
        with BuildLine():
            ThreePointArc((-5.8293856058, 1.4206559961), (-4.882962136, 1.1483711934), (-3.9322703511, 0.8913857306))
            ThreePointArc((-3.9322703511, 0.8913857306), (-4.7126148613, 1.6612123432), (-5.479460273, 2.4444866775))
            ThreePointArc((-5.479460273, 2.4444866775), (-5.6775484228, 1.9404751755), (-5.8293856058, 1.4206559961))
        make_face()
        with BuildLine():
            ThreePointArc((-4.338068025, 4.1450169856), (-3.6545836588, 3.4359996944), (-2.9597531533, 2.7380978628))
            ThreePointArc((-2.9597531533, 2.7380978628), (-3.2506380165, 3.794959521), (-3.5231084567, 4.8567176985))
            ThreePointArc((-3.5231084567, 4.8567176985), (-3.9466635776, 4.5192750088), (-4.338068025, 4.1450169856))
        make_face()
        with BuildLine():
            ThreePointArc((-1.1941724883, 3.8511388839), (-0.9176553403, 4.9118503598), (-0.6227425745, 5.9675951342))
            ThreePointArc((-0.6227425745, 5.9675951342), (-1.158273414, 5.8871387531), (-1.6843686202, 5.7587240211))
            ThreePointArc((-1.6843686202, 5.7587240211), (-1.4469624415, 4.8029548522), (-1.1941724883, 3.8511388839))
        make_face()
        with BuildLine():
            ThreePointArc((-3.5231084567, 4.8567176985), (-2.642509835, 5.3867561456), (-1.6843686202, 5.7587240211))
            ThreePointArc((-1.6843686202, 5.7587240211), (-3.2946158269, 23), (0, 40))
            Line((0, 40), (-1.8896710779, 40.6550902361))
            ThreePointArc((-1.8896710779, 40.6550902361), (-5.3028149221, 22.8743757747), (-3.5231084567, 4.8567176985))
        make_face()
        with BuildLine():
            ThreePointArc((-0.6227425745, 5.9675951342), (0.4048974259, 5.9863225836), (1.4206559961, 5.8293856058))
            ThreePointArc((1.4206559961, 5.8293856058), (8.6467789982, 21.5658922005), (20, 34.6410161514))
            Line((20, 34.6410161514), (18.6910419598, 36.1531764765))
            ThreePointArc((18.6910419598, 36.1531764765), (6.8448154533, 22.4611979777), (-0.6227425745, 5.9675951342))
        make_face()
        with BuildLine():
            ThreePointArc((2.4444866775, 5.479460273), (3.3438127486, 4.9818587196), (4.1450169856, 4.338068025))
            ThreePointArc((4.1450169856, 4.338068025), (18.2712763736, 14.3532210018), (34.6410161514, 20))
            Line((34.6410161514, 20), (34.2635053987, 21.9640482763))
            ThreePointArc((34.2635053987, 21.9640482763), (17.1583830556, 16.0295603214), (2.4444866775, 5.479460273))
        make_face()
        with BuildLine():
            ThreePointArc((4.8567176985, 3.5231084567), (5.3867561456, 2.642509835), (5.7587240211, 1.6843686202))
            ThreePointArc((5.7587240211, 1.6843686202), (23, 3.2946158269), (40, 0))
            Line((40, 0), (40.6550902361, 1.8896710779))
            ThreePointArc((40.6550902361, 1.8896710779), (22.8743757747, 5.3028149221), (4.8567176985, 3.5231084567))
        make_face()
        with BuildLine():
            ThreePointArc((5.9675951342, 0.6227425745), (5.991893307, 0.311792555), (6, 0))
            ThreePointArc((6, 0), (5.9571937032, -0.715432165), (5.8293856058, -1.4206559961))
            ThreePointArc((5.8293856058, -1.4206559961), (21.5658922005, -8.6467789982), (34.6410161514, -20))
            Line((34.6410161514, -20), (36.1531764765, -18.6910419598))
            ThreePointArc((36.1531764765, -18.6910419598), (22.4611979777, -6.8448154533), (5.9675951342, 0.6227425745))
        make_face()
        with BuildLine():
            ThreePointArc((1.8896710779, -40.6550902361), (5.3028149221, -22.8743757747), (3.5231084567, -4.8567176985))
            ThreePointArc((3.5231084567, -4.8567176985), (2.642509835, -5.3867561456), (1.6843686202, -5.7587240211))
            ThreePointArc((1.6843686202, -5.7587240211), (3.2946158269, -23), (0, -40))
            Line((0, -40), (1.8896710779, -40.6550902361))
        make_face()
        with BuildLine():
            ThreePointArc((-18.6910419598, -36.1531764765), (-6.8448154533, -22.4611979777), (0.6227425745, -5.9675951342))
            ThreePointArc((0.6227425745, -5.9675951342), (-0.4048974259, -5.9863225836), (-1.4206559961, -5.8293856058))
            ThreePointArc((-1.4206559961, -5.8293856058), (-8.6467789982, -21.5658922005), (-20, -34.6410161514))
            Line((-20, -34.6410161514), (-18.6910419598, -36.1531764765))
        make_face()
        with BuildLine():
            ThreePointArc((-34.2635053987, -21.9640482763), (-17.1583830556, -16.0295603214), (-2.4444866775, -5.479460273))
            ThreePointArc((-2.4444866775, -5.479460273), (-3.3438127486, -4.9818587196), (-4.1450169856, -4.338068025))
            ThreePointArc((-4.1450169856, -4.338068025), (-18.2712763736, -14.3532210018), (-34.6410161514, -20))
            Line((-34.6410161514, -20), (-34.2635053987, -21.9640482763))
        make_face()
        with BuildLine():
            ThreePointArc((-5.479460273, 2.4444866775), (-4.9818587196, 3.3438127486), (-4.338068025, 4.1450169856))
            ThreePointArc((-4.338068025, 4.1450169856), (-14.3532210018, 18.2712763736), (-20, 34.6410161514))
            Line((-20, 34.6410161514), (-21.9640482763, 34.2635053987))
            ThreePointArc((-21.9640482763, 34.2635053987), (-16.0295603214, 17.1583830556), (-5.479460273, 2.4444866775))
        make_face()
        with BuildLine():
            ThreePointArc((21.9640482763, -34.2635053987), (16.0295603214, -17.1583830556), (5.479460273, -2.4444866775))
            ThreePointArc((5.479460273, -2.4444866775), (4.9818587196, -3.3438127486), (4.338068025, -4.1450169856))
            ThreePointArc((4.338068025, -4.1450169856), (14.3532210018, -18.2712763736), (20, -34.6410161514))
            Line((20, -34.6410161514), (21.9640482763, -34.2635053987))
        make_face()
        with BuildLine():
            ThreePointArc((-4.8567176985, -3.5231084567), (-5.3867561456, -2.642509835), (-5.7587240211, -1.6843686202))
            ThreePointArc((-5.7587240211, -1.6843686202), (-23, -3.2946158269), (-40, 0))
            Line((-40, 0), (-40.6550902361, -1.8896710779))
            ThreePointArc((-40.6550902361, -1.8896710779), (-22.8743757747, -5.3028149221), (-4.8567176985, -3.5231084567))
        make_face()
        with BuildLine():
            ThreePointArc((-5.9675951342, -0.6227425745), (-5.9863225836, 0.4048974259), (-5.8293856058, 1.4206559961))
            ThreePointArc((-5.8293856058, 1.4206559961), (-21.5658922005, 8.6467789982), (-34.6410161514, 20))
            Line((-34.6410161514, 20), (-36.1531764765, 18.6910419598))
            ThreePointArc((-36.1531764765, 18.6910419598), (-22.4611979777, 6.8448154533), (-5.9675951342, -0.6227425745))
        make_face()
    extrude(amount=F1_DEPTH)

    # F2 (on face) → F3 (cut)
    with BuildSketch(Plane(origin=(0, 0, 0), x_dir=(1, 0, 0), z_dir=(0, 0, -1))):
        Circle(F2_R)
    extrude(amount=-F3_DEPTH, mode=Mode.SUBTRACT)

    # F4 (on face) → F5 (join)
    with BuildSketch(Plane.XY.offset(51.9)):
        Circle(F4_R)
    extrude(amount=F5_DEPTH)

    # F6 (on face) → F7 (cut)
    with BuildSketch(Plane.XY.offset(111.9)):
        with BuildLine():
            Line((-1, 4.8989794856), (-1, 2))
            Line((-1, 2), (1, 2))
            Line((1, 2), (1, 4.8989794856))
            ThreePointArc((1, 4.8989794856), (0, 5), (-1, 4.8989794856))
        make_face()
        with BuildLine():
            Line((-2, 1), (-4.8989794856, 1))
            ThreePointArc((-4.8989794856, 1), (-5, 0), (-4.8989794856, -1))
            Line((-4.8989794856, -1), (-2, -1))
            Line((-2, -1), (-2, 1))
        make_face()
        with BuildLine():
            Line((-1, -2), (-1, -4.8989794856))
            ThreePointArc((-1, -4.8989794856), (0, -5), (1, -4.8989794856))
            Line((1, -4.8989794856), (1, -2))
            Line((1, -2), (-1, -2))
        make_face()
        with BuildLine():
            ThreePointArc((5, 0), (4.974680765, 0.50254481), (4.8989794856, 1))
            Line((4.8989794856, 1), (2, 1))
            Line((2, 1), (2, -1))
            Line((2, -1), (4.8989794856, -1))
            ThreePointArc((4.8989794856, -1), (4.974680765, -0.50254481), (5, 0))
        make_face()
    extrude(amount=-F7_DEPTH, mode=Mode.SUBTRACT)


solid = f1.part
